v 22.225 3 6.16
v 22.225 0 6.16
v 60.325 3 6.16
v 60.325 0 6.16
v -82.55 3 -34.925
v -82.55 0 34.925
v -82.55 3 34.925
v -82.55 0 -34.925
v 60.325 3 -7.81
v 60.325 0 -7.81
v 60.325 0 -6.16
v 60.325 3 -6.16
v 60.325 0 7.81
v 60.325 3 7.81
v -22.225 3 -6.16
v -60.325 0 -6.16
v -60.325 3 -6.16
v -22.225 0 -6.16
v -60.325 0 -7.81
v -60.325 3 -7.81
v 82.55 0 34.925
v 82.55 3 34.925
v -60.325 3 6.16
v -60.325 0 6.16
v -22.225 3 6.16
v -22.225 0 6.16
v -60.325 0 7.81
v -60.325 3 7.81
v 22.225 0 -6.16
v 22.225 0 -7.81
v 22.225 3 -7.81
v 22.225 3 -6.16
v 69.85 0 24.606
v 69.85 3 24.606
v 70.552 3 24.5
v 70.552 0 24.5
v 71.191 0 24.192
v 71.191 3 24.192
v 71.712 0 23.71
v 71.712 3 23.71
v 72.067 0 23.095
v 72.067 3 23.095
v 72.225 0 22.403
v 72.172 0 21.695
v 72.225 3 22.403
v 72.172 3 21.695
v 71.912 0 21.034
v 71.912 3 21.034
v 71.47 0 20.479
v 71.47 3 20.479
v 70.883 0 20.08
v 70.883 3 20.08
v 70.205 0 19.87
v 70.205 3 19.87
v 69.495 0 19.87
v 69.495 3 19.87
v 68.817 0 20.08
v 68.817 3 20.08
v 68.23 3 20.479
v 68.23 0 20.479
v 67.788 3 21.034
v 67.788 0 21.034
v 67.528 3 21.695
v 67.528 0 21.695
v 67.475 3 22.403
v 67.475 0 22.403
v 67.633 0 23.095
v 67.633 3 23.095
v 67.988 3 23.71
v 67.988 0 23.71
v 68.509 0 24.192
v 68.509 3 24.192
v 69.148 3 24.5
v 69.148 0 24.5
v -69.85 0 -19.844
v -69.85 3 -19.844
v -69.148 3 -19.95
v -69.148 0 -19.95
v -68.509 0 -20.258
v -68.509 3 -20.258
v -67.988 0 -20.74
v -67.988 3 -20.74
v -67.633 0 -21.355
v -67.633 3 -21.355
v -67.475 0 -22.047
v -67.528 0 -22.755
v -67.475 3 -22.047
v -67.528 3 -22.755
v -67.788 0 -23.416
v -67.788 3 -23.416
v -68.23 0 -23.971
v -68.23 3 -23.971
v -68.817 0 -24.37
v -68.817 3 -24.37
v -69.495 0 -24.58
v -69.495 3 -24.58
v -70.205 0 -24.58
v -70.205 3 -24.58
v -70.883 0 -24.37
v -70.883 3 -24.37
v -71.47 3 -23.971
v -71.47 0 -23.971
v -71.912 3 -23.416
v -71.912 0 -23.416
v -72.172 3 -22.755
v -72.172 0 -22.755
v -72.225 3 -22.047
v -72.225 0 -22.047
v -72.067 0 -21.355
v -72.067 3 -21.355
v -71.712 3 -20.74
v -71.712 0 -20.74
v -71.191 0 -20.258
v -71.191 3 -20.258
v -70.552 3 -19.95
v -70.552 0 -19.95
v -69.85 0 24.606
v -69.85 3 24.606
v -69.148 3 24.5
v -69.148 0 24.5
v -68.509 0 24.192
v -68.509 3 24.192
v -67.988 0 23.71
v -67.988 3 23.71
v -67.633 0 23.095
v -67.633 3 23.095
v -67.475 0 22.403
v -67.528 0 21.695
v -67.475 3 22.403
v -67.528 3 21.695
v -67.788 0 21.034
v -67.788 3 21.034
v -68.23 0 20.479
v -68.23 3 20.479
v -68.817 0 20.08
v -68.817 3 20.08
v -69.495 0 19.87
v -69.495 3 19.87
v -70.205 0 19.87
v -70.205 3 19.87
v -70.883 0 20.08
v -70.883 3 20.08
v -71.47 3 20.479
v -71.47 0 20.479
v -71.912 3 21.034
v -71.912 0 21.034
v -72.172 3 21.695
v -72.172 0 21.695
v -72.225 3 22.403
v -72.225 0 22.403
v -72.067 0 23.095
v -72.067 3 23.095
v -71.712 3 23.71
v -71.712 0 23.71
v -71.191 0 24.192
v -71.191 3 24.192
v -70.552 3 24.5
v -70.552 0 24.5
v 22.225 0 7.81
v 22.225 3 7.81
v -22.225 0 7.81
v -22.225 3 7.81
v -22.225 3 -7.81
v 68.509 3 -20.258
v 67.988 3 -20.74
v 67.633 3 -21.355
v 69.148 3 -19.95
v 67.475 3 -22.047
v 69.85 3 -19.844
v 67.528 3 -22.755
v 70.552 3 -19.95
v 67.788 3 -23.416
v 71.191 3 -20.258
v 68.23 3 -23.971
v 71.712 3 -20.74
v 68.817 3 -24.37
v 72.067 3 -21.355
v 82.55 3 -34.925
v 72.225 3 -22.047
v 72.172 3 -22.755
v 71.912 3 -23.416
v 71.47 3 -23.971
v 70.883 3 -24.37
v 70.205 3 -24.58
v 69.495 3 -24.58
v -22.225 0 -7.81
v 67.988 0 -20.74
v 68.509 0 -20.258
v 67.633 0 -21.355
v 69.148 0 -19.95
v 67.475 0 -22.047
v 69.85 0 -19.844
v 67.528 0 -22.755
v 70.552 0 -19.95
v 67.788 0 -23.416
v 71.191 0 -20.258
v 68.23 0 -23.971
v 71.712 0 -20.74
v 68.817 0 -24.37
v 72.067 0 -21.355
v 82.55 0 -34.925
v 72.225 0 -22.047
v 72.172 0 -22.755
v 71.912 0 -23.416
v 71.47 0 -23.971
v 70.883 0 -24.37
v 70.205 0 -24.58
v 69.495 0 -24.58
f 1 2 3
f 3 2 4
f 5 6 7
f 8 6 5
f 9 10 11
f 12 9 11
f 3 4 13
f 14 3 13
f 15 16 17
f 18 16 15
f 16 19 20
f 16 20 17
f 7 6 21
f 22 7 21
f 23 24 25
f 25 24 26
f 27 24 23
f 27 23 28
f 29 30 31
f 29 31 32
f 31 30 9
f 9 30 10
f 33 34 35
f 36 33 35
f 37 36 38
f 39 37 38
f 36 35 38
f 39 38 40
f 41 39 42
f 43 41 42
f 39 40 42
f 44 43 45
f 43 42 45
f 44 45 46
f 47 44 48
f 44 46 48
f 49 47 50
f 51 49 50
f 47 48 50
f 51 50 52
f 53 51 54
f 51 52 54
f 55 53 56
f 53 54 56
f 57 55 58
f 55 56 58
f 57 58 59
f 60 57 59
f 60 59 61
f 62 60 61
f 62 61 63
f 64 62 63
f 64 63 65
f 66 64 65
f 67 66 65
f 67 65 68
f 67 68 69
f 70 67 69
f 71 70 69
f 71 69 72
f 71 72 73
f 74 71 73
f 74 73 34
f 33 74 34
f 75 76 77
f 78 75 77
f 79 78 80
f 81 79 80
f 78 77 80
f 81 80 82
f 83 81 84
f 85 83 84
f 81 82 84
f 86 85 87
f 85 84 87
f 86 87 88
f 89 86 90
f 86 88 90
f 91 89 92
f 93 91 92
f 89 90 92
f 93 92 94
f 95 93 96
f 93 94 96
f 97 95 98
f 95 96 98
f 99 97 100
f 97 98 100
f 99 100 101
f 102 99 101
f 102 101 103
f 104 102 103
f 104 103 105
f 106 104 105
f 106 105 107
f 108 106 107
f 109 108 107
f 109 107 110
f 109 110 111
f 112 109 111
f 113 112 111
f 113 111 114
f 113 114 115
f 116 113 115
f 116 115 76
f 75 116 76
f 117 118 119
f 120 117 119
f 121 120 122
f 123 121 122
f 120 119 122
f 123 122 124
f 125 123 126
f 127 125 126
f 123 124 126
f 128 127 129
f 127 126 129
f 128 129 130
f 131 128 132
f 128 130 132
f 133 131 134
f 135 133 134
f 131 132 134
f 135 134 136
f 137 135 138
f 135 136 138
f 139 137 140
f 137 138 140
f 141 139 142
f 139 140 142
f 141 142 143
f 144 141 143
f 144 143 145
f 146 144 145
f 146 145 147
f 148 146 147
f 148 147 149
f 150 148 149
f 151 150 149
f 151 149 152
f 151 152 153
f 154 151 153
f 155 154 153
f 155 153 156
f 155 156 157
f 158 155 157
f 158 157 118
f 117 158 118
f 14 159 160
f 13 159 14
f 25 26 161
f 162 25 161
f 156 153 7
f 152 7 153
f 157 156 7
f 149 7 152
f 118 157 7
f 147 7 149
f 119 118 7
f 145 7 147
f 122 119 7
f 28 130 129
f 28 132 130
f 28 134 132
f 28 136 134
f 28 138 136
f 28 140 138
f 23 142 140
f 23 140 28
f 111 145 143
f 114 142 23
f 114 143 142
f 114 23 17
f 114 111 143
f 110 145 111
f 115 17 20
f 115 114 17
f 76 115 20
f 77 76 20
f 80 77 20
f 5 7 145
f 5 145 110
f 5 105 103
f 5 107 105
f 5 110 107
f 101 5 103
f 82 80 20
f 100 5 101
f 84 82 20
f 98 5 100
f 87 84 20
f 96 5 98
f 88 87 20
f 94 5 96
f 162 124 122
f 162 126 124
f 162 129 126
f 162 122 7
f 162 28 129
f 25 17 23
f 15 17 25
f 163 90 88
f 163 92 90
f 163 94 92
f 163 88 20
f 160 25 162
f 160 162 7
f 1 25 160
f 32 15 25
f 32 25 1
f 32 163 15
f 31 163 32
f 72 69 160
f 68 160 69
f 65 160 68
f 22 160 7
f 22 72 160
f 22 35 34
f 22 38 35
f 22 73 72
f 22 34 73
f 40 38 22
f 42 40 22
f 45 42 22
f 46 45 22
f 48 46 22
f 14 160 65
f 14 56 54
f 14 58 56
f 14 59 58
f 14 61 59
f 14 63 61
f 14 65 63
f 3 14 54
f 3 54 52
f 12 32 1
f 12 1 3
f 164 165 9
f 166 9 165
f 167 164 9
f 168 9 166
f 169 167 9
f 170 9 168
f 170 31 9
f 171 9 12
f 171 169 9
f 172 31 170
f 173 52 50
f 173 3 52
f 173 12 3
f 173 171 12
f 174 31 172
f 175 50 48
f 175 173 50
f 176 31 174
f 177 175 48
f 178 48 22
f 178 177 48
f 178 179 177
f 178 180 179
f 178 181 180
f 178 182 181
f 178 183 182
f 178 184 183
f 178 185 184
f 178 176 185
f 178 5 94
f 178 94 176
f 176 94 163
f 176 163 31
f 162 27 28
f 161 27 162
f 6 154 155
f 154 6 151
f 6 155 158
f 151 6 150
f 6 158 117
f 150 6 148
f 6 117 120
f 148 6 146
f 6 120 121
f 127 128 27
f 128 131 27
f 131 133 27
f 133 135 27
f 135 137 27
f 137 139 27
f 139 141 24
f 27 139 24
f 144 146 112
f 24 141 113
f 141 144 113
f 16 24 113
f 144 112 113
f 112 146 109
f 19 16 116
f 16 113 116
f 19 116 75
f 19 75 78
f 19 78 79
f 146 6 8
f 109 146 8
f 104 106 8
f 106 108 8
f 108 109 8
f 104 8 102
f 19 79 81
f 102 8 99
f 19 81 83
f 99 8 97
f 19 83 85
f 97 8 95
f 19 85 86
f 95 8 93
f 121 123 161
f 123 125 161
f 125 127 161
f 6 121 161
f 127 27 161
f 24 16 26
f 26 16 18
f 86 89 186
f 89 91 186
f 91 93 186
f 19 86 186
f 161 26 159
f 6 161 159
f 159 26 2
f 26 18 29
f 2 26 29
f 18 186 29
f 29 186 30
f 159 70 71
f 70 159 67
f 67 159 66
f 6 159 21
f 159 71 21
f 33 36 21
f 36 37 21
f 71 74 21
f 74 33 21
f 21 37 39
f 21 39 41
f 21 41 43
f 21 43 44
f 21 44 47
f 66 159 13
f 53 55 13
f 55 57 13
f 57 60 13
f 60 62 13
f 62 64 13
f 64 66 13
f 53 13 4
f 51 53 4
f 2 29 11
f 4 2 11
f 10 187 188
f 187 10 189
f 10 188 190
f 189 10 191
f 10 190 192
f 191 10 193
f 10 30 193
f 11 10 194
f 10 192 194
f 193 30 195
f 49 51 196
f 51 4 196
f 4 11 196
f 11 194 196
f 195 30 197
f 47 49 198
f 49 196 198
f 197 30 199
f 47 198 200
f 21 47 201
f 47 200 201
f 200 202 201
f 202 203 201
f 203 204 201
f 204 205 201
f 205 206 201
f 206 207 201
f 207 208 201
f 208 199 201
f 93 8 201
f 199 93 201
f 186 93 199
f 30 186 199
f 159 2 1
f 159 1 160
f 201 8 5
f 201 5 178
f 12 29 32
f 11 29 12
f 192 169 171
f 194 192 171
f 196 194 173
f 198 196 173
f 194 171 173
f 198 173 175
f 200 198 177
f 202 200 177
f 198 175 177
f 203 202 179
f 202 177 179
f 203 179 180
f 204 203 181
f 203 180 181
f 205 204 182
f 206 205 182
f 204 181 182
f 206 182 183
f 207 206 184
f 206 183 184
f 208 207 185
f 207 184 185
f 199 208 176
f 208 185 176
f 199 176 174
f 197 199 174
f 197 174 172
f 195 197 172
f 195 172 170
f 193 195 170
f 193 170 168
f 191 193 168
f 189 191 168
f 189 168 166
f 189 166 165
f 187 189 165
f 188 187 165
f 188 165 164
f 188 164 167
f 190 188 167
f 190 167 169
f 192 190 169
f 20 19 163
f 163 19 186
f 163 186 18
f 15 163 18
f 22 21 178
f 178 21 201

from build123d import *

# Parameters (mm, degrees)
SKETCH1_W           = 165.1
SKETCH1_H           = 69.85
BOSS_EXTRUDE1_DEPTH = 3
CUT_EXTRUDE3_REACH  = 91.684
SKETCH8_R           = 2.38125
SKETCH10_W          = 38.1
SKETCH10_H          = 1.651
CUT_EXTRUDE4_DEPTH  = 26.67


with BuildPart() as part:
    # Sketch1 → Boss-Extrude1 (new body)
    with BuildSketch(Plane(origin=(0, 0, 0), x_dir=(1, 0, 0), z_dir=(0, 1, 0))):
        Rectangle(SKETCH1_W, SKETCH1_H)
    extrude(amount=BOSS_EXTRUDE1_DEPTH)

    # Sketch8 → Cut-Extrude3 (cut, up to next)
    with BuildSketch(Plane(origin=(0, 3, 0), x_dir=(1, 0, 0), z_dir=(0, 1, 0)), mode=Mode.PRIVATE) as cut_extrude3_sk1:
        with Locations(Location((-69.85, -22.225, 0), (0, 0, 270))):
            Circle(SKETCH8_R)
    cut_extrude3_tool1 = extrude(cut_extrude3_sk1.sketch, amount=-CUT_EXTRUDE3_REACH, mode=Mode.PRIVATE) & part.part
    # Sketch8 → Cut-Extrude3 (cut, up to next)
    with BuildSketch(Plane(origin=(0, 3, 0), x_dir=(1, 0, 0), z_dir=(0, 1, 0)), mode=Mode.PRIVATE) as cut_extrude3_sk2:
        with Locations(Location((-69.85, 22.225, 0), (0, 0, 270))):
            Circle(SKETCH8_R)
    cut_extrude3_tool2 = extrude(cut_extrude3_sk2.sketch, amount=-CUT_EXTRUDE3_REACH, mode=Mode.PRIVATE) & part.part
    # Sketch8 → Cut-Extrude3 (cut, up to next)
    with BuildSketch(Plane(origin=(0, 3, 0), x_dir=(1, 0, 0), z_dir=(0, 1, 0)), mode=Mode.PRIVATE) as cut_extrude3_sk3:
        with Locations(Location((69.85, 22.225, 0), (0, 0, 270))):
            Circle(SKETCH8_R)
    cut_extrude3_tool3 = extrude(cut_extrude3_sk3.sketch, amount=-CUT_EXTRUDE3_REACH, mode=Mode.PRIVATE) & part.part
    # Sketch8 → Cut-Extrude3 (cut, up to next)
    with BuildSketch(Plane(origin=(0, 3, 0), x_dir=(1, 0, 0), z_dir=(0, 1, 0)), mode=Mode.PRIVATE) as cut_extrude3_sk4:
        with Locations(Location((69.85, -22.225, 0), (0, 0, 270))):
            Circle(SKETCH8_R)
    cut_extrude3_tool4 = extrude(cut_extrude3_sk4.sketch, amount=-CUT_EXTRUDE3_REACH, mode=Mode.PRIVATE) & part.part
    add(cut_extrude3_tool1.solids().sort_by_distance((-69.85, 3, 22.225))[0], mode=Mode.SUBTRACT)
    add(cut_extrude3_tool2.solids().sort_by_distance((-69.85, 3, -22.225))[0], mode=Mode.SUBTRACT)
    add(cut_extrude3_tool3.solids().sort_by_distance((69.85, 3, -22.225))[0], mode=Mode.SUBTRACT)
    add(cut_extrude3_tool4.solids().sort_by_distance((69.85, 3, 22.225))[0], mode=Mode.SUBTRACT)

    # Sketch10 → Cut-Extrude4 (cut)
    with BuildSketch(Plane.XZ):
        with Locations((-41.275, -6.985)):
            Rectangle(SKETCH10_W, SKETCH10_H)
        with Locations((-41.275, 6.985)):
            Rectangle(SKETCH10_W, SKETCH10_H)
        with Locations((41.275, 6.985)):
            Rectangle(SKETCH10_W, SKETCH10_H)
        with Locations((41.275, -6.985)):
            Rectangle(SKETCH10_W, SKETCH10_H)
    extrude(amount=-CUT_EXTRUDE4_DEPTH, mode=Mode.SUBTRACT)


solid = part.part
